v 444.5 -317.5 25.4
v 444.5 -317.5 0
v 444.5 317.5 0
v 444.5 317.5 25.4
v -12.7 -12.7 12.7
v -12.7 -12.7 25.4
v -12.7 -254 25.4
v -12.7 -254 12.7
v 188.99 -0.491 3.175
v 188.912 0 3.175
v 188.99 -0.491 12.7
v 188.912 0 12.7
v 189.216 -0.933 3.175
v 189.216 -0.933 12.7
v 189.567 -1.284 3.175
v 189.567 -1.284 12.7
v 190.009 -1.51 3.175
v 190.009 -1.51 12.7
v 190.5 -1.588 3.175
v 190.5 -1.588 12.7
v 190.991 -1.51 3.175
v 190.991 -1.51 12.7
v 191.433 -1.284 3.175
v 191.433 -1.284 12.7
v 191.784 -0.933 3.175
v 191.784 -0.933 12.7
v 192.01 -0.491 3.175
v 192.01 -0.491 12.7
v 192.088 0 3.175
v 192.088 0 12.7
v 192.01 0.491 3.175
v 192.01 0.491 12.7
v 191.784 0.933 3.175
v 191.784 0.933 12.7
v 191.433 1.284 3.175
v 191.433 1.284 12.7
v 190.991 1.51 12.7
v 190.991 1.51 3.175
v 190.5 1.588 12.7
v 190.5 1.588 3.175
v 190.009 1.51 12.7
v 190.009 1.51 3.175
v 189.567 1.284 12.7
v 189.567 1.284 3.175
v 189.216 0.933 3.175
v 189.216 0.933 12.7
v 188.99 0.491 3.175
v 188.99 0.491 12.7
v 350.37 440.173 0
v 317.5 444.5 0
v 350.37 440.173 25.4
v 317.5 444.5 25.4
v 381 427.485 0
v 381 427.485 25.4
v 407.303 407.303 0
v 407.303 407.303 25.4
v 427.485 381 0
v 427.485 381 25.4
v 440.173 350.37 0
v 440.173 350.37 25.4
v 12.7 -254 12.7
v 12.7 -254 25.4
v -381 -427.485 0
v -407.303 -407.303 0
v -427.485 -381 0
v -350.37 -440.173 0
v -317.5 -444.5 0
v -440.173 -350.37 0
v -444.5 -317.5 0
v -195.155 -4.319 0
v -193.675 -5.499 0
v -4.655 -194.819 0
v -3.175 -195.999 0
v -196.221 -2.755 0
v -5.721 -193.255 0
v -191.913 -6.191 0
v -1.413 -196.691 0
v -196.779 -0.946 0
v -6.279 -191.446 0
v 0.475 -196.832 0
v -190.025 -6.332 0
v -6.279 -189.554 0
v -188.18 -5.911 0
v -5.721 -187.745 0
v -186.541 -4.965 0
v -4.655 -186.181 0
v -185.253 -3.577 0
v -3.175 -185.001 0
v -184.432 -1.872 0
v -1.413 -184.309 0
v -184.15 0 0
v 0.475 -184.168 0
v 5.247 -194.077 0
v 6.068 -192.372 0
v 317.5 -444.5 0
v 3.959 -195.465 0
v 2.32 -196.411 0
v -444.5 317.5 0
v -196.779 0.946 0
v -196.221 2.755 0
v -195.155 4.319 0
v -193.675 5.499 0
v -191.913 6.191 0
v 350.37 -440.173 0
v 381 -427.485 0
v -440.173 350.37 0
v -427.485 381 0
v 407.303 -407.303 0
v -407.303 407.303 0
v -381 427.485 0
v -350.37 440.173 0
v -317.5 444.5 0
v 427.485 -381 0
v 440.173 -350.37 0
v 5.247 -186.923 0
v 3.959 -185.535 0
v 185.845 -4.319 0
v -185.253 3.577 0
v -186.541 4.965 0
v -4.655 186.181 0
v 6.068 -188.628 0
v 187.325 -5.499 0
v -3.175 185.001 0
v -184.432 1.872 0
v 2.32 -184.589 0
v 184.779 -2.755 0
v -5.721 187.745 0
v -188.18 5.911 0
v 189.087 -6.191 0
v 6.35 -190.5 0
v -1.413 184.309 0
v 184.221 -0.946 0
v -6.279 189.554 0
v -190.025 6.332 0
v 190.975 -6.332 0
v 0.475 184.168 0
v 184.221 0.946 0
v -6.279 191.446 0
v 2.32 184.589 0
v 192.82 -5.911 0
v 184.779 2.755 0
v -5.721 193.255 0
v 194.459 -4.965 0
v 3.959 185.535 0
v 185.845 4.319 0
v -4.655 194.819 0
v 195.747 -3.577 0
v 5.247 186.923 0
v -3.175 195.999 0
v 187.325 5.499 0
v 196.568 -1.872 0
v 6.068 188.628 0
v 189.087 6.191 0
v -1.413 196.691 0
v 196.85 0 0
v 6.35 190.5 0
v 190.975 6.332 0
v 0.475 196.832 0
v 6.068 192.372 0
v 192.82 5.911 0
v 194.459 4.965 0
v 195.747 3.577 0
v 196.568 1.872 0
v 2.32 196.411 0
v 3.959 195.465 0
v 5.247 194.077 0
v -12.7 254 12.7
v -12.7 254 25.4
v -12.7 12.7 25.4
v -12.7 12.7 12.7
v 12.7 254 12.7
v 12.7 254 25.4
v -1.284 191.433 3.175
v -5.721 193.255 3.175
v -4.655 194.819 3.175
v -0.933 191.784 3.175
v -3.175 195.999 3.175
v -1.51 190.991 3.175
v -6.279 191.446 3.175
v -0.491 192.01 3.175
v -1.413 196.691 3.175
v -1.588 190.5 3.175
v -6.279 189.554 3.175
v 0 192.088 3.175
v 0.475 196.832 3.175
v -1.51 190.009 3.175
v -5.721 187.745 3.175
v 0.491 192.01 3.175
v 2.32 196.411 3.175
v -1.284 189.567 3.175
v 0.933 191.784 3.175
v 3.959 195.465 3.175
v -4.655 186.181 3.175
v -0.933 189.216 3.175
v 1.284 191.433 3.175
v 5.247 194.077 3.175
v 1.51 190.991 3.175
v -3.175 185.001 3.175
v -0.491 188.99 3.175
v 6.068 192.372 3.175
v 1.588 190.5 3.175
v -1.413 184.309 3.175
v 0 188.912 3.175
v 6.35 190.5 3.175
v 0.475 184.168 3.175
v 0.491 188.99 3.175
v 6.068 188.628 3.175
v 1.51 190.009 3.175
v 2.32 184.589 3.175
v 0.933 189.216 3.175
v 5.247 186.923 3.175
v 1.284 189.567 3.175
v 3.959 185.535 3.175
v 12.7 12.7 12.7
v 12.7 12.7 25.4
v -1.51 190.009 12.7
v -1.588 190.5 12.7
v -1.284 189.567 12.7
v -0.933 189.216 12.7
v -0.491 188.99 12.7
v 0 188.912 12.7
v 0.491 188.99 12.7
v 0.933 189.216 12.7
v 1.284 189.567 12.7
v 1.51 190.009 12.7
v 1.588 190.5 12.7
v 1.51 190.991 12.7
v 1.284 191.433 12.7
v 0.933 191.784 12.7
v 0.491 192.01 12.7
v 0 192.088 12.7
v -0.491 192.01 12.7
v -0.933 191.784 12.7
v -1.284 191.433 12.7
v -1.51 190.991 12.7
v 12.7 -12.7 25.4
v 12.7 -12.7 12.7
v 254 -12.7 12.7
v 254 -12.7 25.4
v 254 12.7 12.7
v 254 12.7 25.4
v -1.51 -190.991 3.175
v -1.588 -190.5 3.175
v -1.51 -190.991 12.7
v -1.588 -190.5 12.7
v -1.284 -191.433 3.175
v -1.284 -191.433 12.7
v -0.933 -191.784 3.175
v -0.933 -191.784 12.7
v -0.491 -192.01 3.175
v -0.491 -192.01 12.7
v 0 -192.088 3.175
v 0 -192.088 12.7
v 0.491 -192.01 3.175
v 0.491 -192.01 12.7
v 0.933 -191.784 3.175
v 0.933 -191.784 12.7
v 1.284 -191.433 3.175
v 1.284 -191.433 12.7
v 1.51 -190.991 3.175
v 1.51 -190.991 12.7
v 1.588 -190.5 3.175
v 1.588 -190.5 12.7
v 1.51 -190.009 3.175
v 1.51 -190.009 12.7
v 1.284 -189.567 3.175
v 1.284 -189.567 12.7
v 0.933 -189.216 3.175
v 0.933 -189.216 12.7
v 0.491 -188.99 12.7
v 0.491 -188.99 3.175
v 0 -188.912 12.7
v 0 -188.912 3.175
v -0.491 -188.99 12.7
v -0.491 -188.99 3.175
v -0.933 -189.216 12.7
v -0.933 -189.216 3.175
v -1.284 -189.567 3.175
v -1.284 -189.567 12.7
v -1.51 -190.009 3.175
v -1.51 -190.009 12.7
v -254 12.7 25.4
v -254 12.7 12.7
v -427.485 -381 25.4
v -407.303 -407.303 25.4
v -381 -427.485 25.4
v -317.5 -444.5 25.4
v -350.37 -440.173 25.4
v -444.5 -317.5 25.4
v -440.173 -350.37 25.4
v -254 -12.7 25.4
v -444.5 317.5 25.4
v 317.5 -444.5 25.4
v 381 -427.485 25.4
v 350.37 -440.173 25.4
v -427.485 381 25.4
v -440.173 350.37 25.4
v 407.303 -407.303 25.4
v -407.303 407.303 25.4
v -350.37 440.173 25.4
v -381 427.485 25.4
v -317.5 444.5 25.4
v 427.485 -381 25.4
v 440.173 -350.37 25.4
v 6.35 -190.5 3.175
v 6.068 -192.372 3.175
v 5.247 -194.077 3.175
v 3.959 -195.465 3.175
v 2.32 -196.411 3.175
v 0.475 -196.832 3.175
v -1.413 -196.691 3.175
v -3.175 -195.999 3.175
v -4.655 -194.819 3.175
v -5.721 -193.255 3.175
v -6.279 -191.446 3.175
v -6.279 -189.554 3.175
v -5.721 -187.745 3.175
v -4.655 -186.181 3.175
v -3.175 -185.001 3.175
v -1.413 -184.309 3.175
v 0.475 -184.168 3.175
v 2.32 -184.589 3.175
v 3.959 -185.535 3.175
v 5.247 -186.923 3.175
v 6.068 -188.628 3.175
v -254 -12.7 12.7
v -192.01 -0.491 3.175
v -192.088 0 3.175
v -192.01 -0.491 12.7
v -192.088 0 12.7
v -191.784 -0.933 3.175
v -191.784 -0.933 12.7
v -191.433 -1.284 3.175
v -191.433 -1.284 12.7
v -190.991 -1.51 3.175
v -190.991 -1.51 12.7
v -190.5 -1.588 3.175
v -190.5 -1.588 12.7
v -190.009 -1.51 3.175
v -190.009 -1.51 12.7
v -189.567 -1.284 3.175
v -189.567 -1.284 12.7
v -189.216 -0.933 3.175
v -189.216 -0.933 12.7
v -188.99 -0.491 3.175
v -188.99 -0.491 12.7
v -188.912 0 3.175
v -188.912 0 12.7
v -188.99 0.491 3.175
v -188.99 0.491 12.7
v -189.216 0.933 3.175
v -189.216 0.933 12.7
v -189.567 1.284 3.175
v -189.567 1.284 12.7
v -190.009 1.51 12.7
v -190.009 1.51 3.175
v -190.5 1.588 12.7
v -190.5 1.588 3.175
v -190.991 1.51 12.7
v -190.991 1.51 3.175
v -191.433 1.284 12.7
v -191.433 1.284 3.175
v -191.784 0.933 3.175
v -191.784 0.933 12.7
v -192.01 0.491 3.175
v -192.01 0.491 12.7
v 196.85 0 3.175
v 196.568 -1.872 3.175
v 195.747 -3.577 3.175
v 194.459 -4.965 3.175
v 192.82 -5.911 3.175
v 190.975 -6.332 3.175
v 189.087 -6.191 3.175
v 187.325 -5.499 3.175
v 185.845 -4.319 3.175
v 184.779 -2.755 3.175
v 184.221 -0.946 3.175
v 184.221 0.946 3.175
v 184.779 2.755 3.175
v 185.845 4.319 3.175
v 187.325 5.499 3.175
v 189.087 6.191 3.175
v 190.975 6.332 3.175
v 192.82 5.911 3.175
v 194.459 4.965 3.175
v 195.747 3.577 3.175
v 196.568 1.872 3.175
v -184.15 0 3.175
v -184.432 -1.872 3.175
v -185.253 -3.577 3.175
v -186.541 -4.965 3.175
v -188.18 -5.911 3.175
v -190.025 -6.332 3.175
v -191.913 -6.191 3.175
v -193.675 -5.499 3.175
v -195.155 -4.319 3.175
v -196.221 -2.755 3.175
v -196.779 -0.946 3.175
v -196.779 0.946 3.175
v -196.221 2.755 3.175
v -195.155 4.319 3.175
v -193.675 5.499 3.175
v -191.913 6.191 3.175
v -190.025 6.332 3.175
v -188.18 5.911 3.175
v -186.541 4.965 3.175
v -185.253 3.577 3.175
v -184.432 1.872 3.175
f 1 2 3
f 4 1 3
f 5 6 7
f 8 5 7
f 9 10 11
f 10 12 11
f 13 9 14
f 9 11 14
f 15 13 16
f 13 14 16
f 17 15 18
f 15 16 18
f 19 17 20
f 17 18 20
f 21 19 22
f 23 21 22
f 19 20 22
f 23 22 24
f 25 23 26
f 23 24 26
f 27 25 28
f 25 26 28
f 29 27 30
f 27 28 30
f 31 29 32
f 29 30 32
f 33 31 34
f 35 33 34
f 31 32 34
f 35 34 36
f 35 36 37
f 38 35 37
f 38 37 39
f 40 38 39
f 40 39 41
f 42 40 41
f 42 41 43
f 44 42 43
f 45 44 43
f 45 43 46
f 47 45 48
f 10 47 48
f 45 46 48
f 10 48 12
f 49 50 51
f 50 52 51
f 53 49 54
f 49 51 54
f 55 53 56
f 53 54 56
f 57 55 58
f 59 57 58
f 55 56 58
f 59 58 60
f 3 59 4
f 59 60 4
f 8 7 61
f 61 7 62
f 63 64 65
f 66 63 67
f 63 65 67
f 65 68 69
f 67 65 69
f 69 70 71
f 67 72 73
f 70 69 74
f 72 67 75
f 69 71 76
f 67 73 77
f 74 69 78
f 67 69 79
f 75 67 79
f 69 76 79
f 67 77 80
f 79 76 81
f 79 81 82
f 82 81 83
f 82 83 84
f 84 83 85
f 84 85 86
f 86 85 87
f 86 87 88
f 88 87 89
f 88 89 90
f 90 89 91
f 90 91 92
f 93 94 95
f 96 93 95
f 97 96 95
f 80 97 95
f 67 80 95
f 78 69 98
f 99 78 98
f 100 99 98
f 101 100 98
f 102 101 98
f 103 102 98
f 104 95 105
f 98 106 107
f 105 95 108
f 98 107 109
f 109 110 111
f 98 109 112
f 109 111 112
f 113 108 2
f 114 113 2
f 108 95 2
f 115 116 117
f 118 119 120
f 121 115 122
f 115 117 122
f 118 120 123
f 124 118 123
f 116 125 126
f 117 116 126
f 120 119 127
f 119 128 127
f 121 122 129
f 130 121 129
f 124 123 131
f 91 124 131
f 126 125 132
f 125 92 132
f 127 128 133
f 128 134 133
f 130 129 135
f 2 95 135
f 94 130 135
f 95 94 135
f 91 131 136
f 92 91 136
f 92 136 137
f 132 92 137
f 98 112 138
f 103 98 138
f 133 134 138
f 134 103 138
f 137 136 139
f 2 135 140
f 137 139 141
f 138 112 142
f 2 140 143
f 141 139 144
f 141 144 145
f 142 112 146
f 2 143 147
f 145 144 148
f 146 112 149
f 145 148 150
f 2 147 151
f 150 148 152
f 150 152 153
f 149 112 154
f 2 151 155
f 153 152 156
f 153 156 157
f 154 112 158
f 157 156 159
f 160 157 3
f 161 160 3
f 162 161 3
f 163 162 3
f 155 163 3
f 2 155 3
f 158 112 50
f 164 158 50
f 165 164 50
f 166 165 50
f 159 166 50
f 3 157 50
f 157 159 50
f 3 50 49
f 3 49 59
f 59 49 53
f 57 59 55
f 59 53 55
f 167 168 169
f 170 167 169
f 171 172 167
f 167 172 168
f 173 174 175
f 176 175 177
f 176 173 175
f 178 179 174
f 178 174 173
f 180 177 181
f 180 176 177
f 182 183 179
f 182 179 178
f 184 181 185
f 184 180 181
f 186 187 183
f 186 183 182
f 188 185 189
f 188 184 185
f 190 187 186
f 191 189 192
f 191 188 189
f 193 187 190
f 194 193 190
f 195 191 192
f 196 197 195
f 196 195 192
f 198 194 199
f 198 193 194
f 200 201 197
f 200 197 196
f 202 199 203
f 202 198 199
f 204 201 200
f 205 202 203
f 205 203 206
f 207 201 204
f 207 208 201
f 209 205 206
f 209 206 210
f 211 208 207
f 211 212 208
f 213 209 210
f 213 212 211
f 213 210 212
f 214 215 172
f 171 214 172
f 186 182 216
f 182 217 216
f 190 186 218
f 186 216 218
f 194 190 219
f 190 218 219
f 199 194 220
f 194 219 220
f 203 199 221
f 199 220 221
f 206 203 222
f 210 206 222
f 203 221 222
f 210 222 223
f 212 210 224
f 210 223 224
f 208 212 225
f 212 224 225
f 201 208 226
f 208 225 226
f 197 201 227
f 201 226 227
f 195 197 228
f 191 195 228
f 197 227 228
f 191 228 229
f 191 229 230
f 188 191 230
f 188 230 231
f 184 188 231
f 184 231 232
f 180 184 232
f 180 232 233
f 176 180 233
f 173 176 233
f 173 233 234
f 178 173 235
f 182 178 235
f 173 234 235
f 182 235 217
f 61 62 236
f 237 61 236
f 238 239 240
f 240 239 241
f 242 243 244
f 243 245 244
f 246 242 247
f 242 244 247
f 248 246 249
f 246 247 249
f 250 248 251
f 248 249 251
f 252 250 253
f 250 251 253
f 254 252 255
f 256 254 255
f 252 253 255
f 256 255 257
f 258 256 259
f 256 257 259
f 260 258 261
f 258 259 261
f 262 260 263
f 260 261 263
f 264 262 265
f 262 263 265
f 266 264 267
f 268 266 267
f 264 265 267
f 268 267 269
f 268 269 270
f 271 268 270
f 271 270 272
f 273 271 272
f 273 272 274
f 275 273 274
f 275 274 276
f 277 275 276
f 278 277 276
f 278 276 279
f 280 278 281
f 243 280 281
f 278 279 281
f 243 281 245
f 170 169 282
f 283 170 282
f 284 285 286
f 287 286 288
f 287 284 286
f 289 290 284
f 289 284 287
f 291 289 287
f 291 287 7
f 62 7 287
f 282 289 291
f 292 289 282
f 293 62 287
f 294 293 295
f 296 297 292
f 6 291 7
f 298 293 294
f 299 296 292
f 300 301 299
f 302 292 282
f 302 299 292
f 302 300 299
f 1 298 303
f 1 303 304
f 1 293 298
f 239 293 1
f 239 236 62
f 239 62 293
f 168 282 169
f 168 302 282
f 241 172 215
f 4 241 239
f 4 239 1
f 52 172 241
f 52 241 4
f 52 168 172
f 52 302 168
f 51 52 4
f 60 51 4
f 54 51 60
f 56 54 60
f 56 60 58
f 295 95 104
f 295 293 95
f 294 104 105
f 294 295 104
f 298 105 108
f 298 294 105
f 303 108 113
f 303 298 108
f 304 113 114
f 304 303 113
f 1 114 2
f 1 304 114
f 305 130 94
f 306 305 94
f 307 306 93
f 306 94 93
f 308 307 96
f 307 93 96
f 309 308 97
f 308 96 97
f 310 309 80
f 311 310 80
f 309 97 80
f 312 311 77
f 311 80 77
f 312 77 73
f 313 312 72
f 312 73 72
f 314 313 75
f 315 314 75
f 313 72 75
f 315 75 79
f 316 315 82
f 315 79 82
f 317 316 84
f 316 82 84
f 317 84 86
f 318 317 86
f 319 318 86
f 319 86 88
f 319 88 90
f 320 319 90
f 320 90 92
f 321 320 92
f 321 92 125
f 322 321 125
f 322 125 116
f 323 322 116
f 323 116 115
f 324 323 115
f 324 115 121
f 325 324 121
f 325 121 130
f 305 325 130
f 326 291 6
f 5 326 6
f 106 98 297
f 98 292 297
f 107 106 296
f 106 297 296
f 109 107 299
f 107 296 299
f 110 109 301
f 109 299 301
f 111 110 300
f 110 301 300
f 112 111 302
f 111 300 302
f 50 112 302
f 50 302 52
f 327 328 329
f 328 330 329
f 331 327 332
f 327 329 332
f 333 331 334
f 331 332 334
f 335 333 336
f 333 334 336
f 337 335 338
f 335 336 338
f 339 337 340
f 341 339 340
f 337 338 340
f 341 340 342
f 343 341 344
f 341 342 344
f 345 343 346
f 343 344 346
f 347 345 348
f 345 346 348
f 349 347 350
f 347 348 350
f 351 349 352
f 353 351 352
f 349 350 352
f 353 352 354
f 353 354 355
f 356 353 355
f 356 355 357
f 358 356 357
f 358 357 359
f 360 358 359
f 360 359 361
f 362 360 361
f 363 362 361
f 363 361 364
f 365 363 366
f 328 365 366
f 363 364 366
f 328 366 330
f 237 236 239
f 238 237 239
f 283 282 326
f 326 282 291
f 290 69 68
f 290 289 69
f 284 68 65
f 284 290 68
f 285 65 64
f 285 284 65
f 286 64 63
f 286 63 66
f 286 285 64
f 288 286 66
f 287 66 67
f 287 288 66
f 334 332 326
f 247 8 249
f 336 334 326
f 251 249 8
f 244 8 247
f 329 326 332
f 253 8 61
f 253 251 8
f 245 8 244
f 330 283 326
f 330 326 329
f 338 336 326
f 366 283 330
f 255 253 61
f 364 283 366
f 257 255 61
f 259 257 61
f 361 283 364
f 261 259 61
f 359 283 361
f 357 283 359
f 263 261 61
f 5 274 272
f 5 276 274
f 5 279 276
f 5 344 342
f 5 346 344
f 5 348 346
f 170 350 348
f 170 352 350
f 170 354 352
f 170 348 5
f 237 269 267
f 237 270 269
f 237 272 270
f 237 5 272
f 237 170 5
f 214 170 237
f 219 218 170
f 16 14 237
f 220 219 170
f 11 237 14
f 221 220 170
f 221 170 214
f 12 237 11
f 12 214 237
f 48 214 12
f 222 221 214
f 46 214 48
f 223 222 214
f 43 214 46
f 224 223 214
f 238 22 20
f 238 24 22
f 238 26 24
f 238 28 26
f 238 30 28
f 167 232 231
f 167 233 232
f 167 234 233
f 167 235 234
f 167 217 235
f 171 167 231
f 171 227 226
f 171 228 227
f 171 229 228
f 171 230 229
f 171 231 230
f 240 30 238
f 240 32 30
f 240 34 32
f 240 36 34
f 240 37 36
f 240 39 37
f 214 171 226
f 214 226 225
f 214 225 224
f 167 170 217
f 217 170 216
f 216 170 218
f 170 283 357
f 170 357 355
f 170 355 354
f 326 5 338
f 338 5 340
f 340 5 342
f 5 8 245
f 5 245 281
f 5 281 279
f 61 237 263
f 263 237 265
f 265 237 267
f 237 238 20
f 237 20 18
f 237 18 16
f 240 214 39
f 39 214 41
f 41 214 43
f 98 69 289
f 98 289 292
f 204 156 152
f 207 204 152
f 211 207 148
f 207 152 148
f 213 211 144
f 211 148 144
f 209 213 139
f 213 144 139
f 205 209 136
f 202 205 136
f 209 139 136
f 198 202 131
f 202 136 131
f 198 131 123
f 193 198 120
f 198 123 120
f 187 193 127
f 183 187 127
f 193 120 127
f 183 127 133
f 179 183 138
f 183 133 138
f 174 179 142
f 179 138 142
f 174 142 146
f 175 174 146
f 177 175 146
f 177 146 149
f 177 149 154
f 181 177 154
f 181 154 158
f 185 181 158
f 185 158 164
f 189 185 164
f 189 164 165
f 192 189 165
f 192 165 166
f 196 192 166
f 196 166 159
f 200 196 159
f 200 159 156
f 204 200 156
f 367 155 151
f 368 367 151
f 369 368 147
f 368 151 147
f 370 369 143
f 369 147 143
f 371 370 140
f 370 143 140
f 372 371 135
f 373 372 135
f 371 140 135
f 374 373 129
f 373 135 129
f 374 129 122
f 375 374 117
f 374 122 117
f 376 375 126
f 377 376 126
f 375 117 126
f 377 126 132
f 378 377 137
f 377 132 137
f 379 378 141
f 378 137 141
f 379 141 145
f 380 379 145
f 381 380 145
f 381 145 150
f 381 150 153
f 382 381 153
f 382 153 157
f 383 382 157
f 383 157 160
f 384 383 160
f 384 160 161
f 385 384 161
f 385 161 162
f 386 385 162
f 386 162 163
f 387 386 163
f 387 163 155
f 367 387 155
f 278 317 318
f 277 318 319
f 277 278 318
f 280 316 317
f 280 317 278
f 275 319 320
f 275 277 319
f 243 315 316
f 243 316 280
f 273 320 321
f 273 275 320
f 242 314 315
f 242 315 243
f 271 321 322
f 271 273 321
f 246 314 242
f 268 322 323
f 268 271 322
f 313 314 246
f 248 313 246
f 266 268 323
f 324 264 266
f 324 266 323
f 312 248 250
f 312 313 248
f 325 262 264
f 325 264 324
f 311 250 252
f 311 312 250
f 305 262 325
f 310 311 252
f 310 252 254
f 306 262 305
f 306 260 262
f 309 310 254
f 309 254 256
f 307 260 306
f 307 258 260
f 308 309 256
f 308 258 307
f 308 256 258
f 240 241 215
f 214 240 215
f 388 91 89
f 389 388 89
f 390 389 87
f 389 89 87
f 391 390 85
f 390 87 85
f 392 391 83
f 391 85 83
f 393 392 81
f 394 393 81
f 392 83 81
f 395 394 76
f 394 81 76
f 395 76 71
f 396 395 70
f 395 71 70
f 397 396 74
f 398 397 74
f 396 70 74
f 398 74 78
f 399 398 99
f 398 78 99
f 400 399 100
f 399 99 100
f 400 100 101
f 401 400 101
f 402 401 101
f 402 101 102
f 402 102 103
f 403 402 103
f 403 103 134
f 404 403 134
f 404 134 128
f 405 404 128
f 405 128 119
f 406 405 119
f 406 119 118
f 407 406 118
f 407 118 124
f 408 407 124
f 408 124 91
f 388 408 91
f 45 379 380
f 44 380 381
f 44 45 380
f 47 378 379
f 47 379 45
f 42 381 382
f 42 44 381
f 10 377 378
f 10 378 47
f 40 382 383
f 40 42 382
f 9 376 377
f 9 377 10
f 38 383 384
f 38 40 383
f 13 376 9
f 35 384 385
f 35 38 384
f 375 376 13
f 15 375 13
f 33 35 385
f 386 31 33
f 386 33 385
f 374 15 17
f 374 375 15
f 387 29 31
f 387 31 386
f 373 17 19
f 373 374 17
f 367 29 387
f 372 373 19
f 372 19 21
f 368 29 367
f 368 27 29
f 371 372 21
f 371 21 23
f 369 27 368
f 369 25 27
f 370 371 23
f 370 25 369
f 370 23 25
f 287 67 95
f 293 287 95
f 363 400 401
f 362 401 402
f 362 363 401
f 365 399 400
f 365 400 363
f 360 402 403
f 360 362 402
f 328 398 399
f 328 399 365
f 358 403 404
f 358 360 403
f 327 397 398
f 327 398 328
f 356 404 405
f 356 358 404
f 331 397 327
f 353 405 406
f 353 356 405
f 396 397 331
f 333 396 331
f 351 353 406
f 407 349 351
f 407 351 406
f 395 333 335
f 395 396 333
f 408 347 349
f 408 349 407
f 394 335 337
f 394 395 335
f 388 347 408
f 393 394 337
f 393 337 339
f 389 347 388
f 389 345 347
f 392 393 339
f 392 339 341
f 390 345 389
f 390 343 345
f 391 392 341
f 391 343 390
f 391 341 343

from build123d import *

# Parameters (mm, degrees)
F0_W           = 889
F0_H           = 889
F1_DEPTH       = 25.4
F6_DEPTH       = 12.7
F3_D           = 3.175
F3_DEPTH       = 63.5
F3_CBORE_D     = 12.7
F3_CBORE_DEPTH = 3.175
F4_R           = 127


with BuildPart() as f1:
    # F0 (on Top) → F1 (new body)
    with BuildSketch(Plane.XY):
        Rectangle(F0_W, F0_H)
    extrude(amount=F1_DEPTH)

    # F5 (on face) → F6 (cut)
    with BuildSketch(Plane.XY.offset(25.4)):
        Polygon((12.7, 12.7), (12.7, 254), (-12.7, 254), (-12.7, 12.7), (-254, 12.7), (-254, -12.7), (-12.7, -12.7), (-12.7, -254), (12.7, -254), (12.7, -12.7), (254, -12.7), (254, 12.7), align=None)
    extrude(amount=-F6_DEPTH, mode=Mode.SUBTRACT)

    # F3
    with Locations(Plane(origin=(0, 0, 0), x_dir=(1, 0, 0), z_dir=(0, 0, -1))):
        with Locations((-190.5, 0), (0, 190.5), (190.5, 0), (0, -190.5)):
            CounterBoreHole(F3_D / 2, F3_CBORE_D / 2, F3_CBORE_DEPTH, depth=F3_DEPTH)

    # F4
    f4_edges = [f1.edges().sort_by_distance(p)[0] for p in [
        (444.5, -444.5, 12.7),
        (444.5, 444.5, 12.7),
        (-444.5, 444.5, 12.7),
        (-444.5, -444.5, 12.7),
    ]]
    fillet(f4_edges, radius=F4_R)


solid = f1.part
